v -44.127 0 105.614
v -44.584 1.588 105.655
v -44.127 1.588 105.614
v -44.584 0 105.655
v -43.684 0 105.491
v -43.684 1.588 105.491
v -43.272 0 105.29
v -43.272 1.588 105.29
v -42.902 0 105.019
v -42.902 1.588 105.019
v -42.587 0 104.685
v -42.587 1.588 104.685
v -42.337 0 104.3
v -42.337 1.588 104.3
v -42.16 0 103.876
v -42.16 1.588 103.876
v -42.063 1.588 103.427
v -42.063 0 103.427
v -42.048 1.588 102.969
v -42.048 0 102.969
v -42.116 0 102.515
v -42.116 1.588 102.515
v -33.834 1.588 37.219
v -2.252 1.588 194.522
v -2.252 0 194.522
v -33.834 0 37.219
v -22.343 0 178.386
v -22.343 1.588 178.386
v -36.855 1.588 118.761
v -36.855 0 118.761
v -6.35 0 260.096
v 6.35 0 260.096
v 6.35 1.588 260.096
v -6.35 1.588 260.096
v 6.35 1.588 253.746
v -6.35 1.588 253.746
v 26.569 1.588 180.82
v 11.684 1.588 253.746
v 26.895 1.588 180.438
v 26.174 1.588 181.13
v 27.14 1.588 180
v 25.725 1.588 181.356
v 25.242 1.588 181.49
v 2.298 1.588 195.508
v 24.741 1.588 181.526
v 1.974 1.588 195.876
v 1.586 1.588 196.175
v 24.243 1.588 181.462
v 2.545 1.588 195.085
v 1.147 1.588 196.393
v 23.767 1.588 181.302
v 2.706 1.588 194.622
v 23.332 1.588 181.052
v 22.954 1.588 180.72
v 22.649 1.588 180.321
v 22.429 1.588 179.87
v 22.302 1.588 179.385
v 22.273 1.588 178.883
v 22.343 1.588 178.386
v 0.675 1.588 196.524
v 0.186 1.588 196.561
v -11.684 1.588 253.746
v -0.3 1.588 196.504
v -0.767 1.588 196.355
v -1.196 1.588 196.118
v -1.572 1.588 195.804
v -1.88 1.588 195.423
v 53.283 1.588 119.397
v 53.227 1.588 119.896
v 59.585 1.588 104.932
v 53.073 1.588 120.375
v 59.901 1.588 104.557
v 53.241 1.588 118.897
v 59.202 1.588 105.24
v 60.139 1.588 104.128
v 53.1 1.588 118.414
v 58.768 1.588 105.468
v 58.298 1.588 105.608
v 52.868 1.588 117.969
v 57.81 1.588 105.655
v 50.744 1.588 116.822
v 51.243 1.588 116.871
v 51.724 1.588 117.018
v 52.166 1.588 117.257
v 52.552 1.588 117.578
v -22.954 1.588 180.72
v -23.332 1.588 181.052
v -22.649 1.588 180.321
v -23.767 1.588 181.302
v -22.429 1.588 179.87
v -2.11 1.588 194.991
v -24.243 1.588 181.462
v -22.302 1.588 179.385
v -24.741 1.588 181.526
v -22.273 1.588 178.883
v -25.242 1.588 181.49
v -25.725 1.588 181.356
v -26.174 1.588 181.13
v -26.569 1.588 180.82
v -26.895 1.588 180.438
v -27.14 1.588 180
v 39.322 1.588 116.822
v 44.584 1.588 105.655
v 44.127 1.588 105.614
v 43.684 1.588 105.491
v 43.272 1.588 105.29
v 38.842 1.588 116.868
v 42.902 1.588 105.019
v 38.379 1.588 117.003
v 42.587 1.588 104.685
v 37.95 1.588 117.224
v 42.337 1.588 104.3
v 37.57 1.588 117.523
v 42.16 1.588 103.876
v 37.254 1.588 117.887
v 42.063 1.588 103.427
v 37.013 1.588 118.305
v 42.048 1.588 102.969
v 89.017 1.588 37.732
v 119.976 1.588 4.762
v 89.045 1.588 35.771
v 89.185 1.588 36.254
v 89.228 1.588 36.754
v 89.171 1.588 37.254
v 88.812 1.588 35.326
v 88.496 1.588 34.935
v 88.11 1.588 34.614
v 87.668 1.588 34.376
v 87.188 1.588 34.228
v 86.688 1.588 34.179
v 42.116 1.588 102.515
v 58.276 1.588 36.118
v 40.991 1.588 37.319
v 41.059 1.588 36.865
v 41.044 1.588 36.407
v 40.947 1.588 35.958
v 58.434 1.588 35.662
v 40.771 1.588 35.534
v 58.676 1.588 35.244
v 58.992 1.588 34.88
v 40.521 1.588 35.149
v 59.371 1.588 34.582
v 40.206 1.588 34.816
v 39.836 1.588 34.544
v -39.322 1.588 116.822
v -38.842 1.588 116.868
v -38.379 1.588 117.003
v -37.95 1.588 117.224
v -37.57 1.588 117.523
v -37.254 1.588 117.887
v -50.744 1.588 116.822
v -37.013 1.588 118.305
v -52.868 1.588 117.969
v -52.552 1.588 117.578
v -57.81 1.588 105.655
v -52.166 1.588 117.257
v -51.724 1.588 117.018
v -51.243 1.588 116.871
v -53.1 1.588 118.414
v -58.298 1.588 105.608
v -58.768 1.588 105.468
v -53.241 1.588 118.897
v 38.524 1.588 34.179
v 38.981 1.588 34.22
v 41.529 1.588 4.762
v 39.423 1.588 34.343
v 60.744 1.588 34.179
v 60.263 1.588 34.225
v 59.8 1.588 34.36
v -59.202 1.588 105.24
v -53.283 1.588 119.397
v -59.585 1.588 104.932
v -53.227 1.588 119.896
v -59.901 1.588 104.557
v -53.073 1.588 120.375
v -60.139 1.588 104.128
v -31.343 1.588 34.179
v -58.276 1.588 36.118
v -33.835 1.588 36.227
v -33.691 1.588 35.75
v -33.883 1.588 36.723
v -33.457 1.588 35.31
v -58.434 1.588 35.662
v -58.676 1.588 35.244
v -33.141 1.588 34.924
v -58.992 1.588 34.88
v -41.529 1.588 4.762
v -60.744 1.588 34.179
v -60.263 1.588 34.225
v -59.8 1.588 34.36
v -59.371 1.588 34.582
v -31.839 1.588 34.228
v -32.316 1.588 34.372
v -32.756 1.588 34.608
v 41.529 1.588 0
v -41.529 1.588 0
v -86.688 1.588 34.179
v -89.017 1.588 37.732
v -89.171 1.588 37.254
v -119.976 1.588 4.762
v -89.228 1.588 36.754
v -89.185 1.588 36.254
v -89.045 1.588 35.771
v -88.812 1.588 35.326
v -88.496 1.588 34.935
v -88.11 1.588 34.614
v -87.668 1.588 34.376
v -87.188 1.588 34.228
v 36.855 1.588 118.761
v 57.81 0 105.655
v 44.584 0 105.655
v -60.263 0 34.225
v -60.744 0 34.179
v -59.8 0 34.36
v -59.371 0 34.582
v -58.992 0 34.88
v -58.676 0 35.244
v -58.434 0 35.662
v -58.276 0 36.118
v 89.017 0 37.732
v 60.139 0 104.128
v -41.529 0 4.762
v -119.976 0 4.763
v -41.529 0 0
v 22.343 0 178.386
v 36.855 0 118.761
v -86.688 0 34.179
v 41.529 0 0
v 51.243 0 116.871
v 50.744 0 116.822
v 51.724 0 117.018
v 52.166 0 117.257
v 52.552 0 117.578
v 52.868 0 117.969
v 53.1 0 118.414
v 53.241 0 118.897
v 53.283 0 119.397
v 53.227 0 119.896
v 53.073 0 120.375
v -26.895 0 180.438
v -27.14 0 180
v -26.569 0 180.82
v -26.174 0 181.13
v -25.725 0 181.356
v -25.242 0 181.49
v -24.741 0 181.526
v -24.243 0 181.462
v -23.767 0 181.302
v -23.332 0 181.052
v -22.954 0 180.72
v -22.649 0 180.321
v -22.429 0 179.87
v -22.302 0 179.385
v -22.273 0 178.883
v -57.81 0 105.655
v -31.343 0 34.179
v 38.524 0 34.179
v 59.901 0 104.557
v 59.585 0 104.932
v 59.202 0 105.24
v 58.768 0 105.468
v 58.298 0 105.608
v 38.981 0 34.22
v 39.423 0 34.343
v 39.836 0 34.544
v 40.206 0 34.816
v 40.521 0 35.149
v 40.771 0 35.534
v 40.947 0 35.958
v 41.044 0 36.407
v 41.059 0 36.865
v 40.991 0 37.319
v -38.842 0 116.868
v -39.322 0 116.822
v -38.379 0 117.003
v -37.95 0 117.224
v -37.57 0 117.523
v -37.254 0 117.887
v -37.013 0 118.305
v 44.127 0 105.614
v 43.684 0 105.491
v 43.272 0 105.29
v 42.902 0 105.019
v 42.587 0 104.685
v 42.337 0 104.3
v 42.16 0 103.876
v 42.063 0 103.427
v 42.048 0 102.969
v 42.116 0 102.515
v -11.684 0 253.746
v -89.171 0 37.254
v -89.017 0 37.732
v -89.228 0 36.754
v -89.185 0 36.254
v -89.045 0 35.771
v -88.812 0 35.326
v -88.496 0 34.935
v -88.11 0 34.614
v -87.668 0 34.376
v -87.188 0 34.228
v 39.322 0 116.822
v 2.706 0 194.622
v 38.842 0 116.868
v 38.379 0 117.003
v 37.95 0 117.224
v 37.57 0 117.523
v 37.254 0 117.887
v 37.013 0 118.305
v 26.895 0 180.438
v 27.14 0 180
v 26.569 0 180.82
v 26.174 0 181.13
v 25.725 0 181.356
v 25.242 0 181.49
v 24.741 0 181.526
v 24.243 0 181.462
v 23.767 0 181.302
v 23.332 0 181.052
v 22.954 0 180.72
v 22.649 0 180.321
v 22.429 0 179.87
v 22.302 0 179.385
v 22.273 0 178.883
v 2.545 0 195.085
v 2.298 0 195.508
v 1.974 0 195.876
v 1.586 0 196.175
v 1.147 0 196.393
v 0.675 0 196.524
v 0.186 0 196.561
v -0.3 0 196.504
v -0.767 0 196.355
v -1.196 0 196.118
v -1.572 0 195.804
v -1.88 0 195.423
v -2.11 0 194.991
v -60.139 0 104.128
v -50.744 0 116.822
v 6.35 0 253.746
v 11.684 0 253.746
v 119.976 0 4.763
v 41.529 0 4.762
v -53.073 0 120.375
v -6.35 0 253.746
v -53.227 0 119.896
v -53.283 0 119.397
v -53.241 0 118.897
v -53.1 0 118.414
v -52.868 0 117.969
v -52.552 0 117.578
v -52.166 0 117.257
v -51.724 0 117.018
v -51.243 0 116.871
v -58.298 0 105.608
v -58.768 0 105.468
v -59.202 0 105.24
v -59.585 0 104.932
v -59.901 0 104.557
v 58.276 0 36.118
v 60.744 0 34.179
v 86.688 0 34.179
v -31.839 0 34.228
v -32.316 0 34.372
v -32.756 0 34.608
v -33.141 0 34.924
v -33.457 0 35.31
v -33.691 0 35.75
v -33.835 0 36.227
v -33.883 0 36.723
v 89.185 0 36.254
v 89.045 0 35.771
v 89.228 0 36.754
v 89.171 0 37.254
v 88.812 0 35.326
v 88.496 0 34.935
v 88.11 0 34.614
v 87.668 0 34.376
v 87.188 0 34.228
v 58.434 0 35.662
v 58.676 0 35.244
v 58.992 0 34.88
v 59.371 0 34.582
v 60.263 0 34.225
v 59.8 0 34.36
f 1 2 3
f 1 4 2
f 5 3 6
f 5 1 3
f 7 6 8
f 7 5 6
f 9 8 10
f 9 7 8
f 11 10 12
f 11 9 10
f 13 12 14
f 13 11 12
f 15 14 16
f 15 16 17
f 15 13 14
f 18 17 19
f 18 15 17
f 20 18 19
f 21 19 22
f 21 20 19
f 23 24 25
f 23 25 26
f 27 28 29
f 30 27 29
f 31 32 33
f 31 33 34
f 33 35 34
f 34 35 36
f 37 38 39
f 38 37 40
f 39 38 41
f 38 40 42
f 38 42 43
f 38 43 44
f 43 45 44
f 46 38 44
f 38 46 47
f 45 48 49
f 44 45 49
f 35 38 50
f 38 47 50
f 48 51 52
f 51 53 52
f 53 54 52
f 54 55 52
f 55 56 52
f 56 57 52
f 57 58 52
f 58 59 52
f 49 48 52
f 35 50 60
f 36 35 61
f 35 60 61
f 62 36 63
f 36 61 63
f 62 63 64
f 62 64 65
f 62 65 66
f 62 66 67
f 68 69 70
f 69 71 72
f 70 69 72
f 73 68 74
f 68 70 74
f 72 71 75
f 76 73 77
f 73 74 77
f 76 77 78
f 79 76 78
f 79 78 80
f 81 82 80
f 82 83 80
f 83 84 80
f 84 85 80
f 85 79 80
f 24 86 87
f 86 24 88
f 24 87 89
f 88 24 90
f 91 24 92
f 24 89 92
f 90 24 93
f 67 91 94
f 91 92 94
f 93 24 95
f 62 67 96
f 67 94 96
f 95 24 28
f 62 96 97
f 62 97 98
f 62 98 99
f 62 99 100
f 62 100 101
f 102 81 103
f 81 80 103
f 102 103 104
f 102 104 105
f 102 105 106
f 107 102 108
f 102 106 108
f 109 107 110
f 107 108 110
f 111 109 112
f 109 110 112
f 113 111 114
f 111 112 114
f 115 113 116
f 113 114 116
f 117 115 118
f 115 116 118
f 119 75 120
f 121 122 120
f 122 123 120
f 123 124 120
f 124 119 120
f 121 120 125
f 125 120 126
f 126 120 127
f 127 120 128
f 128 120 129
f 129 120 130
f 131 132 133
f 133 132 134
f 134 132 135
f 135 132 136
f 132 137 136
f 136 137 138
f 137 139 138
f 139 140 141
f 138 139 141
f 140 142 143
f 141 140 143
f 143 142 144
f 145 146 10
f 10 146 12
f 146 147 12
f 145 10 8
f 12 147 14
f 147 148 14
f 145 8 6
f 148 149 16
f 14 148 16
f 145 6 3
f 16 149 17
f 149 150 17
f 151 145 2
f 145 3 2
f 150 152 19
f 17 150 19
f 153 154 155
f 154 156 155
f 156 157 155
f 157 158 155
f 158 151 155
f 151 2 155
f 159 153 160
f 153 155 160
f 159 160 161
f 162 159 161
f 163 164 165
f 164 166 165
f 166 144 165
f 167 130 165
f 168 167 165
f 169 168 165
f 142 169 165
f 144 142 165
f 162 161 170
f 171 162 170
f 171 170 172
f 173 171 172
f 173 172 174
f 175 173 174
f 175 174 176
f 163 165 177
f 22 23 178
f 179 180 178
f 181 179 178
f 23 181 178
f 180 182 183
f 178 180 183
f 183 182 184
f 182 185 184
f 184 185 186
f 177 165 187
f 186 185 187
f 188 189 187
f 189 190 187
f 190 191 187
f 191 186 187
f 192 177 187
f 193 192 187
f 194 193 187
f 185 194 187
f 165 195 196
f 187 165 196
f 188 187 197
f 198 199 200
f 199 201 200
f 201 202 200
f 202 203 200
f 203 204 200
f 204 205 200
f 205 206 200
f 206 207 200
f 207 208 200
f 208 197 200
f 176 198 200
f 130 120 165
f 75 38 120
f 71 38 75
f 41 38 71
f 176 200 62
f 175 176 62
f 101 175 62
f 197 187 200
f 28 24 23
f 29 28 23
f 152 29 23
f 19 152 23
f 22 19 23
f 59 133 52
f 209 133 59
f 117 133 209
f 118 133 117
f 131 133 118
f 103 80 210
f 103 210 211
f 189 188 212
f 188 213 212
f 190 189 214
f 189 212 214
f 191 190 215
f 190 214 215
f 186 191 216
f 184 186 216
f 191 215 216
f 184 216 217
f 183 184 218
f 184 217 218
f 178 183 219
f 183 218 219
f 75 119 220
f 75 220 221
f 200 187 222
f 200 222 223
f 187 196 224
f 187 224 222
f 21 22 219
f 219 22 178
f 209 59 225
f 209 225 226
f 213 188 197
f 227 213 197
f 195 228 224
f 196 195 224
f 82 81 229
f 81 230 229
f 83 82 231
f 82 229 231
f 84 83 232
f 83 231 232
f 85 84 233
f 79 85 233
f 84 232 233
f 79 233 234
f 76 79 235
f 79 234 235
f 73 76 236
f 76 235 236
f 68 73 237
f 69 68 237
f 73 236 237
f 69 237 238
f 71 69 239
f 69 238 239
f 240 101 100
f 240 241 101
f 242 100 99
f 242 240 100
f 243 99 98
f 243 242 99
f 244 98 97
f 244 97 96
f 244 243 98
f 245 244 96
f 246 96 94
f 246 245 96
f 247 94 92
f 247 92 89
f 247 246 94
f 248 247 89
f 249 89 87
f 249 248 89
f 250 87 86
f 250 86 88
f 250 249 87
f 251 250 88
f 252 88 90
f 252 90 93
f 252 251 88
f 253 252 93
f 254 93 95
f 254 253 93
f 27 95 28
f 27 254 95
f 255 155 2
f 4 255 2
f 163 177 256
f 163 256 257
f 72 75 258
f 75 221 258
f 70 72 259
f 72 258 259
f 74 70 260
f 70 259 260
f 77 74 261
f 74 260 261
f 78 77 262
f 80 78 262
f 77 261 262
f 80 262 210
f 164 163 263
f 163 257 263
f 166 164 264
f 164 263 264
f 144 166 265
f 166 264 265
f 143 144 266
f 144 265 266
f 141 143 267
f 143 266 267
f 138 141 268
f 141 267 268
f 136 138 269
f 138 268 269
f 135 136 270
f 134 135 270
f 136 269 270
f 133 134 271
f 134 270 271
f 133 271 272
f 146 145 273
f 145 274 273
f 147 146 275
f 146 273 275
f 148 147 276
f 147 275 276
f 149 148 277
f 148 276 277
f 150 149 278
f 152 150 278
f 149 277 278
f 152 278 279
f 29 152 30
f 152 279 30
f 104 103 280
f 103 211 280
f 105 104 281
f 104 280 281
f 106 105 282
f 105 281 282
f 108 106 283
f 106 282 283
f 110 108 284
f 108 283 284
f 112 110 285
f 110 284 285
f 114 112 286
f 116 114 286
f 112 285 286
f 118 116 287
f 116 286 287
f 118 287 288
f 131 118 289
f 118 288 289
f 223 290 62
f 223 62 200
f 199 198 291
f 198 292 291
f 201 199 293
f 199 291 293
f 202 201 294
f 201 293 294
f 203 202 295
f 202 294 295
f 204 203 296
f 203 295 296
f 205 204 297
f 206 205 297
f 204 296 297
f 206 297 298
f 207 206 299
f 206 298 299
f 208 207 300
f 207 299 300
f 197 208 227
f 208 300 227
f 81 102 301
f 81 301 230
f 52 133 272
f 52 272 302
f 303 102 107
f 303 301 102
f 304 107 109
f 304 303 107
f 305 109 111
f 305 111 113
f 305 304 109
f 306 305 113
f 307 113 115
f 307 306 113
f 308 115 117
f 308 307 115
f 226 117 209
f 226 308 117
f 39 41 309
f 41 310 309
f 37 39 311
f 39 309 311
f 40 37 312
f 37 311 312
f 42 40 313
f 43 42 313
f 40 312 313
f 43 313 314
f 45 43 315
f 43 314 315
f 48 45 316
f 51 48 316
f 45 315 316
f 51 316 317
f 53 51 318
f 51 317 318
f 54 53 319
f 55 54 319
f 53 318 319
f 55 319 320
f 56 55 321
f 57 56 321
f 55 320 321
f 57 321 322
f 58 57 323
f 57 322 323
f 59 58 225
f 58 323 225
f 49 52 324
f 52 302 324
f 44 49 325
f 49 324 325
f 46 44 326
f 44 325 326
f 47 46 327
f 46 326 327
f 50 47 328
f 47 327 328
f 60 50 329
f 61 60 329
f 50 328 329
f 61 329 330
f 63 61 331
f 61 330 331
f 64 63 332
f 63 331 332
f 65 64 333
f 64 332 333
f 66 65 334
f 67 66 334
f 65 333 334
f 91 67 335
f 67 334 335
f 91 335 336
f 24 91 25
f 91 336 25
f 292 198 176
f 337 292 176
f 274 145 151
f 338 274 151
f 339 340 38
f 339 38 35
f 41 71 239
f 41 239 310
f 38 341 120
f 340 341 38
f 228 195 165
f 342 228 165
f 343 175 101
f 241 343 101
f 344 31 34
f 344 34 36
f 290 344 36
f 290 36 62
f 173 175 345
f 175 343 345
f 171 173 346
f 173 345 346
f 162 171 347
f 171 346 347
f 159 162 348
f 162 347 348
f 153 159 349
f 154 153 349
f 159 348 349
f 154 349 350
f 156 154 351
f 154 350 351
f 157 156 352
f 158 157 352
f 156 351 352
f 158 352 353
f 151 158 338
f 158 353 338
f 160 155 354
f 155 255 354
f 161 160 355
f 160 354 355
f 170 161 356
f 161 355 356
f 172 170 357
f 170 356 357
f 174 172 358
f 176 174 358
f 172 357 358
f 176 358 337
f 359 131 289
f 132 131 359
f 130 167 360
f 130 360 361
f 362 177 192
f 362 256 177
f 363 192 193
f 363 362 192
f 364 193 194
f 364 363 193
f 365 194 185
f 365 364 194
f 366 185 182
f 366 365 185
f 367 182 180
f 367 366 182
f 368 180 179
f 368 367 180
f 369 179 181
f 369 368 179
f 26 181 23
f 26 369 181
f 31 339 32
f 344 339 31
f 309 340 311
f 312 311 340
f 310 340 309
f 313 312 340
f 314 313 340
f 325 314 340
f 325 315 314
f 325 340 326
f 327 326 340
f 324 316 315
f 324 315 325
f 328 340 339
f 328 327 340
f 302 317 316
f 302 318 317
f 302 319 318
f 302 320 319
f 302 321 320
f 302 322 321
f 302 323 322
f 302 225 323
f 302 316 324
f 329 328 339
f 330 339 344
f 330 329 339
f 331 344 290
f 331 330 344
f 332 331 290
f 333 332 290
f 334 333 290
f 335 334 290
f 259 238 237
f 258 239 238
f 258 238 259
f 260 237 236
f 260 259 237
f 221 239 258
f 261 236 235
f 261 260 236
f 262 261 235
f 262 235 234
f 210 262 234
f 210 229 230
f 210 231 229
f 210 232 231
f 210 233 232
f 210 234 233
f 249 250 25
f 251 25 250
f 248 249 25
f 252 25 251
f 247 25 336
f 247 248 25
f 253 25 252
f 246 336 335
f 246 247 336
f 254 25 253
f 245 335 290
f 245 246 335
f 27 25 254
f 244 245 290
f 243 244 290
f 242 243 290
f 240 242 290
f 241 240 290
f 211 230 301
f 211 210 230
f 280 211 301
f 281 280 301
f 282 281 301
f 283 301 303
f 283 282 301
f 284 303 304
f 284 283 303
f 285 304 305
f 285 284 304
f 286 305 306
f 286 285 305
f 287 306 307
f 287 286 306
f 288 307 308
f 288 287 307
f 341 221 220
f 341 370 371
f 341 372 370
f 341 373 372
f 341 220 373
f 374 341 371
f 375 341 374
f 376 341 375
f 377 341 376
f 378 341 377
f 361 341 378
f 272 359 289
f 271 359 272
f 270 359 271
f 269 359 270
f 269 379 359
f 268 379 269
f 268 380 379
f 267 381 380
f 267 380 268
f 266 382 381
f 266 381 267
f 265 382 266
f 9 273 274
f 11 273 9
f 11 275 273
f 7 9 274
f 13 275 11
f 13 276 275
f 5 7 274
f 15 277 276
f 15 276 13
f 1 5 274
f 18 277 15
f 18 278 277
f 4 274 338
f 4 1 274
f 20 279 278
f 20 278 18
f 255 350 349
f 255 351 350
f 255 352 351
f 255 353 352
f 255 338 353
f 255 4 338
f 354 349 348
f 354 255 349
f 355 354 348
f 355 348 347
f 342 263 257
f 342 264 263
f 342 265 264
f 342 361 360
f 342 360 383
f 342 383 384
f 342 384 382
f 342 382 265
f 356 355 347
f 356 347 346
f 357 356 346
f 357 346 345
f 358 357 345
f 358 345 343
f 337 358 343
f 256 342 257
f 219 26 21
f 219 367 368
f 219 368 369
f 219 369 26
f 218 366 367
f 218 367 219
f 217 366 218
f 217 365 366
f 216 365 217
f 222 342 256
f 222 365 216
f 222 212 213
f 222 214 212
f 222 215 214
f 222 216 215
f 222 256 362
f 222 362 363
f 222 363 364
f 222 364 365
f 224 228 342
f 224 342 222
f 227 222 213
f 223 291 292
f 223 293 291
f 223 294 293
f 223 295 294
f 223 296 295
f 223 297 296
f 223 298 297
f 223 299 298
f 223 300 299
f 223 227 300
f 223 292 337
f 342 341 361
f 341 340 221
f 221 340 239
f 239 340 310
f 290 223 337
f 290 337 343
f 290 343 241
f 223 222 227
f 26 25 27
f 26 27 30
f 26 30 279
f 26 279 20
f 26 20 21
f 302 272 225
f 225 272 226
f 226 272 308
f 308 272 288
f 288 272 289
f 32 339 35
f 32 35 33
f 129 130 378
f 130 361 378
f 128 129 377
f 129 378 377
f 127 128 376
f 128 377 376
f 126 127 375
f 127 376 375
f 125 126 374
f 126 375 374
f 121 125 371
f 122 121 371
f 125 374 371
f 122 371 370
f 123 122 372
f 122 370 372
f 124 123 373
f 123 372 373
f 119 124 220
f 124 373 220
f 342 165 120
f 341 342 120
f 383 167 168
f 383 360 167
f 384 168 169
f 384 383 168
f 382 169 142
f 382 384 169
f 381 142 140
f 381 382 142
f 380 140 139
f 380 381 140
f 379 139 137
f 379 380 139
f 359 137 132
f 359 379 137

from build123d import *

# Parameters (mm, degrees)
BOSS_EXTRUDE1_DEPTH = 1.5875
CUT_EXTRUDE1_DEPTH  = 288.311537501
CUT_EXTRUDE2_DEPTH  = 1.5875
FILLET1_R           = 2.54


with BuildPart() as part:
    # Sketch2 → Boss-Extrude1 (new body)
    with BuildSketch(Plane(origin=(0, 0, 0), x_dir=(1, 0, 0), z_dir=(0, 1, 0))):
        Polygon((-122.047, 0), (0, 0), (122.047, 0), (11.684, -253.746), (6.35, -253.746), (6.35, -260.096), (-6.35, -260.096), (-6.35, -253.746), (-11.684, -253.746), align=None)
    extrude(amount=BOSS_EXTRUDE1_DEPTH)

    # Sketch3 → Cut-Extrude1 (cut, through all)
    with BuildSketch(Plane(origin=(0, 1.5875, 0), x_dir=(1, 0, 0), z_dir=(0, 1, 0))):
        Polygon((41.529, 0), (41.529, -4.7625), (119.975622372, -4.7625), (122.047, 0), align=None)
        Polygon((-119.975622372, -4.7625), (-122.047, 0), (-41.529, 0), (-41.529, -4.7625), align=None)
    extrude(amount=-CUT_EXTRUDE1_DEPTH, mode=Mode.SUBTRACT)

    # Sketch4 → Cut-Extrude2 (cut)
    with BuildSketch(Plane(origin=(0, 1.5875, 0), x_dir=(1, 0, 0), z_dir=(0, 1, 0))):
        Polygon((37.326544741, -116.821662879), (54.618110353, -116.821662879), (15.355253515, -207.09460645), align=None)
        Polygon((-34.444106562, -34.178727637), (41.755893438, -34.178727637), (0, -205.740215459), align=None)
        Polygon((58.747863162, -34.178727637), (90.562410016, -34.178727637), (59.474716621, -105.655380576), (41.351351035, -105.655380576), align=None)
        Polygon((-15.355253515, -207.09460645), (-37.326544741, -116.821662879), (-54.618110353, -116.821662879), align=None)
        Polygon((-41.351351035, -105.655380576), (-58.747863162, -34.178727637), (-90.562410016, -34.178727637), (-59.474716621, -105.655380576), align=None)
    extrude(amount=-CUT_EXTRUDE2_DEPTH, mode=Mode.SUBTRACT)

    # Fillet1
    fillet1_edges = [part.edges().sort_by_distance(p)[0] for p in [
        (-15.355253515, 0.79375, 207.09460645),
        (-54.618110353, 0.79375, 116.821662879),
        (-37.326544741, 0.79375, 116.821662879),
        (37.326544741, 0.79375, 116.821662879),
        (15.355253515, 0.79375, 207.09460645),
        (54.618110353, 0.79375, 116.821662879),
        (90.562410016, 0.79375, 34.178727637),
        (58.747863162, 0.79375, 34.178727637),
        (41.351351035, 0.79375, 105.655380576),
        (59.474716621, 0.79375, 105.655380576),
        (-41.351351035, 0.79375, 105.655380576),
        (-59.474716621, 0.79375, 105.655380576),
        (-90.562410016, 0.79375, 34.178727637),
        (-58.747863162, 0.79375, 34.178727637),
        (-34.444106562, 0.79375, 34.178727637),
        (0, 0.79375, 205.740215459),
        (41.755893438, 0.79375, 34.178727637),
    ]]
    fillet(fillet1_edges, radius=FILLET1_R)


solid = part.part
